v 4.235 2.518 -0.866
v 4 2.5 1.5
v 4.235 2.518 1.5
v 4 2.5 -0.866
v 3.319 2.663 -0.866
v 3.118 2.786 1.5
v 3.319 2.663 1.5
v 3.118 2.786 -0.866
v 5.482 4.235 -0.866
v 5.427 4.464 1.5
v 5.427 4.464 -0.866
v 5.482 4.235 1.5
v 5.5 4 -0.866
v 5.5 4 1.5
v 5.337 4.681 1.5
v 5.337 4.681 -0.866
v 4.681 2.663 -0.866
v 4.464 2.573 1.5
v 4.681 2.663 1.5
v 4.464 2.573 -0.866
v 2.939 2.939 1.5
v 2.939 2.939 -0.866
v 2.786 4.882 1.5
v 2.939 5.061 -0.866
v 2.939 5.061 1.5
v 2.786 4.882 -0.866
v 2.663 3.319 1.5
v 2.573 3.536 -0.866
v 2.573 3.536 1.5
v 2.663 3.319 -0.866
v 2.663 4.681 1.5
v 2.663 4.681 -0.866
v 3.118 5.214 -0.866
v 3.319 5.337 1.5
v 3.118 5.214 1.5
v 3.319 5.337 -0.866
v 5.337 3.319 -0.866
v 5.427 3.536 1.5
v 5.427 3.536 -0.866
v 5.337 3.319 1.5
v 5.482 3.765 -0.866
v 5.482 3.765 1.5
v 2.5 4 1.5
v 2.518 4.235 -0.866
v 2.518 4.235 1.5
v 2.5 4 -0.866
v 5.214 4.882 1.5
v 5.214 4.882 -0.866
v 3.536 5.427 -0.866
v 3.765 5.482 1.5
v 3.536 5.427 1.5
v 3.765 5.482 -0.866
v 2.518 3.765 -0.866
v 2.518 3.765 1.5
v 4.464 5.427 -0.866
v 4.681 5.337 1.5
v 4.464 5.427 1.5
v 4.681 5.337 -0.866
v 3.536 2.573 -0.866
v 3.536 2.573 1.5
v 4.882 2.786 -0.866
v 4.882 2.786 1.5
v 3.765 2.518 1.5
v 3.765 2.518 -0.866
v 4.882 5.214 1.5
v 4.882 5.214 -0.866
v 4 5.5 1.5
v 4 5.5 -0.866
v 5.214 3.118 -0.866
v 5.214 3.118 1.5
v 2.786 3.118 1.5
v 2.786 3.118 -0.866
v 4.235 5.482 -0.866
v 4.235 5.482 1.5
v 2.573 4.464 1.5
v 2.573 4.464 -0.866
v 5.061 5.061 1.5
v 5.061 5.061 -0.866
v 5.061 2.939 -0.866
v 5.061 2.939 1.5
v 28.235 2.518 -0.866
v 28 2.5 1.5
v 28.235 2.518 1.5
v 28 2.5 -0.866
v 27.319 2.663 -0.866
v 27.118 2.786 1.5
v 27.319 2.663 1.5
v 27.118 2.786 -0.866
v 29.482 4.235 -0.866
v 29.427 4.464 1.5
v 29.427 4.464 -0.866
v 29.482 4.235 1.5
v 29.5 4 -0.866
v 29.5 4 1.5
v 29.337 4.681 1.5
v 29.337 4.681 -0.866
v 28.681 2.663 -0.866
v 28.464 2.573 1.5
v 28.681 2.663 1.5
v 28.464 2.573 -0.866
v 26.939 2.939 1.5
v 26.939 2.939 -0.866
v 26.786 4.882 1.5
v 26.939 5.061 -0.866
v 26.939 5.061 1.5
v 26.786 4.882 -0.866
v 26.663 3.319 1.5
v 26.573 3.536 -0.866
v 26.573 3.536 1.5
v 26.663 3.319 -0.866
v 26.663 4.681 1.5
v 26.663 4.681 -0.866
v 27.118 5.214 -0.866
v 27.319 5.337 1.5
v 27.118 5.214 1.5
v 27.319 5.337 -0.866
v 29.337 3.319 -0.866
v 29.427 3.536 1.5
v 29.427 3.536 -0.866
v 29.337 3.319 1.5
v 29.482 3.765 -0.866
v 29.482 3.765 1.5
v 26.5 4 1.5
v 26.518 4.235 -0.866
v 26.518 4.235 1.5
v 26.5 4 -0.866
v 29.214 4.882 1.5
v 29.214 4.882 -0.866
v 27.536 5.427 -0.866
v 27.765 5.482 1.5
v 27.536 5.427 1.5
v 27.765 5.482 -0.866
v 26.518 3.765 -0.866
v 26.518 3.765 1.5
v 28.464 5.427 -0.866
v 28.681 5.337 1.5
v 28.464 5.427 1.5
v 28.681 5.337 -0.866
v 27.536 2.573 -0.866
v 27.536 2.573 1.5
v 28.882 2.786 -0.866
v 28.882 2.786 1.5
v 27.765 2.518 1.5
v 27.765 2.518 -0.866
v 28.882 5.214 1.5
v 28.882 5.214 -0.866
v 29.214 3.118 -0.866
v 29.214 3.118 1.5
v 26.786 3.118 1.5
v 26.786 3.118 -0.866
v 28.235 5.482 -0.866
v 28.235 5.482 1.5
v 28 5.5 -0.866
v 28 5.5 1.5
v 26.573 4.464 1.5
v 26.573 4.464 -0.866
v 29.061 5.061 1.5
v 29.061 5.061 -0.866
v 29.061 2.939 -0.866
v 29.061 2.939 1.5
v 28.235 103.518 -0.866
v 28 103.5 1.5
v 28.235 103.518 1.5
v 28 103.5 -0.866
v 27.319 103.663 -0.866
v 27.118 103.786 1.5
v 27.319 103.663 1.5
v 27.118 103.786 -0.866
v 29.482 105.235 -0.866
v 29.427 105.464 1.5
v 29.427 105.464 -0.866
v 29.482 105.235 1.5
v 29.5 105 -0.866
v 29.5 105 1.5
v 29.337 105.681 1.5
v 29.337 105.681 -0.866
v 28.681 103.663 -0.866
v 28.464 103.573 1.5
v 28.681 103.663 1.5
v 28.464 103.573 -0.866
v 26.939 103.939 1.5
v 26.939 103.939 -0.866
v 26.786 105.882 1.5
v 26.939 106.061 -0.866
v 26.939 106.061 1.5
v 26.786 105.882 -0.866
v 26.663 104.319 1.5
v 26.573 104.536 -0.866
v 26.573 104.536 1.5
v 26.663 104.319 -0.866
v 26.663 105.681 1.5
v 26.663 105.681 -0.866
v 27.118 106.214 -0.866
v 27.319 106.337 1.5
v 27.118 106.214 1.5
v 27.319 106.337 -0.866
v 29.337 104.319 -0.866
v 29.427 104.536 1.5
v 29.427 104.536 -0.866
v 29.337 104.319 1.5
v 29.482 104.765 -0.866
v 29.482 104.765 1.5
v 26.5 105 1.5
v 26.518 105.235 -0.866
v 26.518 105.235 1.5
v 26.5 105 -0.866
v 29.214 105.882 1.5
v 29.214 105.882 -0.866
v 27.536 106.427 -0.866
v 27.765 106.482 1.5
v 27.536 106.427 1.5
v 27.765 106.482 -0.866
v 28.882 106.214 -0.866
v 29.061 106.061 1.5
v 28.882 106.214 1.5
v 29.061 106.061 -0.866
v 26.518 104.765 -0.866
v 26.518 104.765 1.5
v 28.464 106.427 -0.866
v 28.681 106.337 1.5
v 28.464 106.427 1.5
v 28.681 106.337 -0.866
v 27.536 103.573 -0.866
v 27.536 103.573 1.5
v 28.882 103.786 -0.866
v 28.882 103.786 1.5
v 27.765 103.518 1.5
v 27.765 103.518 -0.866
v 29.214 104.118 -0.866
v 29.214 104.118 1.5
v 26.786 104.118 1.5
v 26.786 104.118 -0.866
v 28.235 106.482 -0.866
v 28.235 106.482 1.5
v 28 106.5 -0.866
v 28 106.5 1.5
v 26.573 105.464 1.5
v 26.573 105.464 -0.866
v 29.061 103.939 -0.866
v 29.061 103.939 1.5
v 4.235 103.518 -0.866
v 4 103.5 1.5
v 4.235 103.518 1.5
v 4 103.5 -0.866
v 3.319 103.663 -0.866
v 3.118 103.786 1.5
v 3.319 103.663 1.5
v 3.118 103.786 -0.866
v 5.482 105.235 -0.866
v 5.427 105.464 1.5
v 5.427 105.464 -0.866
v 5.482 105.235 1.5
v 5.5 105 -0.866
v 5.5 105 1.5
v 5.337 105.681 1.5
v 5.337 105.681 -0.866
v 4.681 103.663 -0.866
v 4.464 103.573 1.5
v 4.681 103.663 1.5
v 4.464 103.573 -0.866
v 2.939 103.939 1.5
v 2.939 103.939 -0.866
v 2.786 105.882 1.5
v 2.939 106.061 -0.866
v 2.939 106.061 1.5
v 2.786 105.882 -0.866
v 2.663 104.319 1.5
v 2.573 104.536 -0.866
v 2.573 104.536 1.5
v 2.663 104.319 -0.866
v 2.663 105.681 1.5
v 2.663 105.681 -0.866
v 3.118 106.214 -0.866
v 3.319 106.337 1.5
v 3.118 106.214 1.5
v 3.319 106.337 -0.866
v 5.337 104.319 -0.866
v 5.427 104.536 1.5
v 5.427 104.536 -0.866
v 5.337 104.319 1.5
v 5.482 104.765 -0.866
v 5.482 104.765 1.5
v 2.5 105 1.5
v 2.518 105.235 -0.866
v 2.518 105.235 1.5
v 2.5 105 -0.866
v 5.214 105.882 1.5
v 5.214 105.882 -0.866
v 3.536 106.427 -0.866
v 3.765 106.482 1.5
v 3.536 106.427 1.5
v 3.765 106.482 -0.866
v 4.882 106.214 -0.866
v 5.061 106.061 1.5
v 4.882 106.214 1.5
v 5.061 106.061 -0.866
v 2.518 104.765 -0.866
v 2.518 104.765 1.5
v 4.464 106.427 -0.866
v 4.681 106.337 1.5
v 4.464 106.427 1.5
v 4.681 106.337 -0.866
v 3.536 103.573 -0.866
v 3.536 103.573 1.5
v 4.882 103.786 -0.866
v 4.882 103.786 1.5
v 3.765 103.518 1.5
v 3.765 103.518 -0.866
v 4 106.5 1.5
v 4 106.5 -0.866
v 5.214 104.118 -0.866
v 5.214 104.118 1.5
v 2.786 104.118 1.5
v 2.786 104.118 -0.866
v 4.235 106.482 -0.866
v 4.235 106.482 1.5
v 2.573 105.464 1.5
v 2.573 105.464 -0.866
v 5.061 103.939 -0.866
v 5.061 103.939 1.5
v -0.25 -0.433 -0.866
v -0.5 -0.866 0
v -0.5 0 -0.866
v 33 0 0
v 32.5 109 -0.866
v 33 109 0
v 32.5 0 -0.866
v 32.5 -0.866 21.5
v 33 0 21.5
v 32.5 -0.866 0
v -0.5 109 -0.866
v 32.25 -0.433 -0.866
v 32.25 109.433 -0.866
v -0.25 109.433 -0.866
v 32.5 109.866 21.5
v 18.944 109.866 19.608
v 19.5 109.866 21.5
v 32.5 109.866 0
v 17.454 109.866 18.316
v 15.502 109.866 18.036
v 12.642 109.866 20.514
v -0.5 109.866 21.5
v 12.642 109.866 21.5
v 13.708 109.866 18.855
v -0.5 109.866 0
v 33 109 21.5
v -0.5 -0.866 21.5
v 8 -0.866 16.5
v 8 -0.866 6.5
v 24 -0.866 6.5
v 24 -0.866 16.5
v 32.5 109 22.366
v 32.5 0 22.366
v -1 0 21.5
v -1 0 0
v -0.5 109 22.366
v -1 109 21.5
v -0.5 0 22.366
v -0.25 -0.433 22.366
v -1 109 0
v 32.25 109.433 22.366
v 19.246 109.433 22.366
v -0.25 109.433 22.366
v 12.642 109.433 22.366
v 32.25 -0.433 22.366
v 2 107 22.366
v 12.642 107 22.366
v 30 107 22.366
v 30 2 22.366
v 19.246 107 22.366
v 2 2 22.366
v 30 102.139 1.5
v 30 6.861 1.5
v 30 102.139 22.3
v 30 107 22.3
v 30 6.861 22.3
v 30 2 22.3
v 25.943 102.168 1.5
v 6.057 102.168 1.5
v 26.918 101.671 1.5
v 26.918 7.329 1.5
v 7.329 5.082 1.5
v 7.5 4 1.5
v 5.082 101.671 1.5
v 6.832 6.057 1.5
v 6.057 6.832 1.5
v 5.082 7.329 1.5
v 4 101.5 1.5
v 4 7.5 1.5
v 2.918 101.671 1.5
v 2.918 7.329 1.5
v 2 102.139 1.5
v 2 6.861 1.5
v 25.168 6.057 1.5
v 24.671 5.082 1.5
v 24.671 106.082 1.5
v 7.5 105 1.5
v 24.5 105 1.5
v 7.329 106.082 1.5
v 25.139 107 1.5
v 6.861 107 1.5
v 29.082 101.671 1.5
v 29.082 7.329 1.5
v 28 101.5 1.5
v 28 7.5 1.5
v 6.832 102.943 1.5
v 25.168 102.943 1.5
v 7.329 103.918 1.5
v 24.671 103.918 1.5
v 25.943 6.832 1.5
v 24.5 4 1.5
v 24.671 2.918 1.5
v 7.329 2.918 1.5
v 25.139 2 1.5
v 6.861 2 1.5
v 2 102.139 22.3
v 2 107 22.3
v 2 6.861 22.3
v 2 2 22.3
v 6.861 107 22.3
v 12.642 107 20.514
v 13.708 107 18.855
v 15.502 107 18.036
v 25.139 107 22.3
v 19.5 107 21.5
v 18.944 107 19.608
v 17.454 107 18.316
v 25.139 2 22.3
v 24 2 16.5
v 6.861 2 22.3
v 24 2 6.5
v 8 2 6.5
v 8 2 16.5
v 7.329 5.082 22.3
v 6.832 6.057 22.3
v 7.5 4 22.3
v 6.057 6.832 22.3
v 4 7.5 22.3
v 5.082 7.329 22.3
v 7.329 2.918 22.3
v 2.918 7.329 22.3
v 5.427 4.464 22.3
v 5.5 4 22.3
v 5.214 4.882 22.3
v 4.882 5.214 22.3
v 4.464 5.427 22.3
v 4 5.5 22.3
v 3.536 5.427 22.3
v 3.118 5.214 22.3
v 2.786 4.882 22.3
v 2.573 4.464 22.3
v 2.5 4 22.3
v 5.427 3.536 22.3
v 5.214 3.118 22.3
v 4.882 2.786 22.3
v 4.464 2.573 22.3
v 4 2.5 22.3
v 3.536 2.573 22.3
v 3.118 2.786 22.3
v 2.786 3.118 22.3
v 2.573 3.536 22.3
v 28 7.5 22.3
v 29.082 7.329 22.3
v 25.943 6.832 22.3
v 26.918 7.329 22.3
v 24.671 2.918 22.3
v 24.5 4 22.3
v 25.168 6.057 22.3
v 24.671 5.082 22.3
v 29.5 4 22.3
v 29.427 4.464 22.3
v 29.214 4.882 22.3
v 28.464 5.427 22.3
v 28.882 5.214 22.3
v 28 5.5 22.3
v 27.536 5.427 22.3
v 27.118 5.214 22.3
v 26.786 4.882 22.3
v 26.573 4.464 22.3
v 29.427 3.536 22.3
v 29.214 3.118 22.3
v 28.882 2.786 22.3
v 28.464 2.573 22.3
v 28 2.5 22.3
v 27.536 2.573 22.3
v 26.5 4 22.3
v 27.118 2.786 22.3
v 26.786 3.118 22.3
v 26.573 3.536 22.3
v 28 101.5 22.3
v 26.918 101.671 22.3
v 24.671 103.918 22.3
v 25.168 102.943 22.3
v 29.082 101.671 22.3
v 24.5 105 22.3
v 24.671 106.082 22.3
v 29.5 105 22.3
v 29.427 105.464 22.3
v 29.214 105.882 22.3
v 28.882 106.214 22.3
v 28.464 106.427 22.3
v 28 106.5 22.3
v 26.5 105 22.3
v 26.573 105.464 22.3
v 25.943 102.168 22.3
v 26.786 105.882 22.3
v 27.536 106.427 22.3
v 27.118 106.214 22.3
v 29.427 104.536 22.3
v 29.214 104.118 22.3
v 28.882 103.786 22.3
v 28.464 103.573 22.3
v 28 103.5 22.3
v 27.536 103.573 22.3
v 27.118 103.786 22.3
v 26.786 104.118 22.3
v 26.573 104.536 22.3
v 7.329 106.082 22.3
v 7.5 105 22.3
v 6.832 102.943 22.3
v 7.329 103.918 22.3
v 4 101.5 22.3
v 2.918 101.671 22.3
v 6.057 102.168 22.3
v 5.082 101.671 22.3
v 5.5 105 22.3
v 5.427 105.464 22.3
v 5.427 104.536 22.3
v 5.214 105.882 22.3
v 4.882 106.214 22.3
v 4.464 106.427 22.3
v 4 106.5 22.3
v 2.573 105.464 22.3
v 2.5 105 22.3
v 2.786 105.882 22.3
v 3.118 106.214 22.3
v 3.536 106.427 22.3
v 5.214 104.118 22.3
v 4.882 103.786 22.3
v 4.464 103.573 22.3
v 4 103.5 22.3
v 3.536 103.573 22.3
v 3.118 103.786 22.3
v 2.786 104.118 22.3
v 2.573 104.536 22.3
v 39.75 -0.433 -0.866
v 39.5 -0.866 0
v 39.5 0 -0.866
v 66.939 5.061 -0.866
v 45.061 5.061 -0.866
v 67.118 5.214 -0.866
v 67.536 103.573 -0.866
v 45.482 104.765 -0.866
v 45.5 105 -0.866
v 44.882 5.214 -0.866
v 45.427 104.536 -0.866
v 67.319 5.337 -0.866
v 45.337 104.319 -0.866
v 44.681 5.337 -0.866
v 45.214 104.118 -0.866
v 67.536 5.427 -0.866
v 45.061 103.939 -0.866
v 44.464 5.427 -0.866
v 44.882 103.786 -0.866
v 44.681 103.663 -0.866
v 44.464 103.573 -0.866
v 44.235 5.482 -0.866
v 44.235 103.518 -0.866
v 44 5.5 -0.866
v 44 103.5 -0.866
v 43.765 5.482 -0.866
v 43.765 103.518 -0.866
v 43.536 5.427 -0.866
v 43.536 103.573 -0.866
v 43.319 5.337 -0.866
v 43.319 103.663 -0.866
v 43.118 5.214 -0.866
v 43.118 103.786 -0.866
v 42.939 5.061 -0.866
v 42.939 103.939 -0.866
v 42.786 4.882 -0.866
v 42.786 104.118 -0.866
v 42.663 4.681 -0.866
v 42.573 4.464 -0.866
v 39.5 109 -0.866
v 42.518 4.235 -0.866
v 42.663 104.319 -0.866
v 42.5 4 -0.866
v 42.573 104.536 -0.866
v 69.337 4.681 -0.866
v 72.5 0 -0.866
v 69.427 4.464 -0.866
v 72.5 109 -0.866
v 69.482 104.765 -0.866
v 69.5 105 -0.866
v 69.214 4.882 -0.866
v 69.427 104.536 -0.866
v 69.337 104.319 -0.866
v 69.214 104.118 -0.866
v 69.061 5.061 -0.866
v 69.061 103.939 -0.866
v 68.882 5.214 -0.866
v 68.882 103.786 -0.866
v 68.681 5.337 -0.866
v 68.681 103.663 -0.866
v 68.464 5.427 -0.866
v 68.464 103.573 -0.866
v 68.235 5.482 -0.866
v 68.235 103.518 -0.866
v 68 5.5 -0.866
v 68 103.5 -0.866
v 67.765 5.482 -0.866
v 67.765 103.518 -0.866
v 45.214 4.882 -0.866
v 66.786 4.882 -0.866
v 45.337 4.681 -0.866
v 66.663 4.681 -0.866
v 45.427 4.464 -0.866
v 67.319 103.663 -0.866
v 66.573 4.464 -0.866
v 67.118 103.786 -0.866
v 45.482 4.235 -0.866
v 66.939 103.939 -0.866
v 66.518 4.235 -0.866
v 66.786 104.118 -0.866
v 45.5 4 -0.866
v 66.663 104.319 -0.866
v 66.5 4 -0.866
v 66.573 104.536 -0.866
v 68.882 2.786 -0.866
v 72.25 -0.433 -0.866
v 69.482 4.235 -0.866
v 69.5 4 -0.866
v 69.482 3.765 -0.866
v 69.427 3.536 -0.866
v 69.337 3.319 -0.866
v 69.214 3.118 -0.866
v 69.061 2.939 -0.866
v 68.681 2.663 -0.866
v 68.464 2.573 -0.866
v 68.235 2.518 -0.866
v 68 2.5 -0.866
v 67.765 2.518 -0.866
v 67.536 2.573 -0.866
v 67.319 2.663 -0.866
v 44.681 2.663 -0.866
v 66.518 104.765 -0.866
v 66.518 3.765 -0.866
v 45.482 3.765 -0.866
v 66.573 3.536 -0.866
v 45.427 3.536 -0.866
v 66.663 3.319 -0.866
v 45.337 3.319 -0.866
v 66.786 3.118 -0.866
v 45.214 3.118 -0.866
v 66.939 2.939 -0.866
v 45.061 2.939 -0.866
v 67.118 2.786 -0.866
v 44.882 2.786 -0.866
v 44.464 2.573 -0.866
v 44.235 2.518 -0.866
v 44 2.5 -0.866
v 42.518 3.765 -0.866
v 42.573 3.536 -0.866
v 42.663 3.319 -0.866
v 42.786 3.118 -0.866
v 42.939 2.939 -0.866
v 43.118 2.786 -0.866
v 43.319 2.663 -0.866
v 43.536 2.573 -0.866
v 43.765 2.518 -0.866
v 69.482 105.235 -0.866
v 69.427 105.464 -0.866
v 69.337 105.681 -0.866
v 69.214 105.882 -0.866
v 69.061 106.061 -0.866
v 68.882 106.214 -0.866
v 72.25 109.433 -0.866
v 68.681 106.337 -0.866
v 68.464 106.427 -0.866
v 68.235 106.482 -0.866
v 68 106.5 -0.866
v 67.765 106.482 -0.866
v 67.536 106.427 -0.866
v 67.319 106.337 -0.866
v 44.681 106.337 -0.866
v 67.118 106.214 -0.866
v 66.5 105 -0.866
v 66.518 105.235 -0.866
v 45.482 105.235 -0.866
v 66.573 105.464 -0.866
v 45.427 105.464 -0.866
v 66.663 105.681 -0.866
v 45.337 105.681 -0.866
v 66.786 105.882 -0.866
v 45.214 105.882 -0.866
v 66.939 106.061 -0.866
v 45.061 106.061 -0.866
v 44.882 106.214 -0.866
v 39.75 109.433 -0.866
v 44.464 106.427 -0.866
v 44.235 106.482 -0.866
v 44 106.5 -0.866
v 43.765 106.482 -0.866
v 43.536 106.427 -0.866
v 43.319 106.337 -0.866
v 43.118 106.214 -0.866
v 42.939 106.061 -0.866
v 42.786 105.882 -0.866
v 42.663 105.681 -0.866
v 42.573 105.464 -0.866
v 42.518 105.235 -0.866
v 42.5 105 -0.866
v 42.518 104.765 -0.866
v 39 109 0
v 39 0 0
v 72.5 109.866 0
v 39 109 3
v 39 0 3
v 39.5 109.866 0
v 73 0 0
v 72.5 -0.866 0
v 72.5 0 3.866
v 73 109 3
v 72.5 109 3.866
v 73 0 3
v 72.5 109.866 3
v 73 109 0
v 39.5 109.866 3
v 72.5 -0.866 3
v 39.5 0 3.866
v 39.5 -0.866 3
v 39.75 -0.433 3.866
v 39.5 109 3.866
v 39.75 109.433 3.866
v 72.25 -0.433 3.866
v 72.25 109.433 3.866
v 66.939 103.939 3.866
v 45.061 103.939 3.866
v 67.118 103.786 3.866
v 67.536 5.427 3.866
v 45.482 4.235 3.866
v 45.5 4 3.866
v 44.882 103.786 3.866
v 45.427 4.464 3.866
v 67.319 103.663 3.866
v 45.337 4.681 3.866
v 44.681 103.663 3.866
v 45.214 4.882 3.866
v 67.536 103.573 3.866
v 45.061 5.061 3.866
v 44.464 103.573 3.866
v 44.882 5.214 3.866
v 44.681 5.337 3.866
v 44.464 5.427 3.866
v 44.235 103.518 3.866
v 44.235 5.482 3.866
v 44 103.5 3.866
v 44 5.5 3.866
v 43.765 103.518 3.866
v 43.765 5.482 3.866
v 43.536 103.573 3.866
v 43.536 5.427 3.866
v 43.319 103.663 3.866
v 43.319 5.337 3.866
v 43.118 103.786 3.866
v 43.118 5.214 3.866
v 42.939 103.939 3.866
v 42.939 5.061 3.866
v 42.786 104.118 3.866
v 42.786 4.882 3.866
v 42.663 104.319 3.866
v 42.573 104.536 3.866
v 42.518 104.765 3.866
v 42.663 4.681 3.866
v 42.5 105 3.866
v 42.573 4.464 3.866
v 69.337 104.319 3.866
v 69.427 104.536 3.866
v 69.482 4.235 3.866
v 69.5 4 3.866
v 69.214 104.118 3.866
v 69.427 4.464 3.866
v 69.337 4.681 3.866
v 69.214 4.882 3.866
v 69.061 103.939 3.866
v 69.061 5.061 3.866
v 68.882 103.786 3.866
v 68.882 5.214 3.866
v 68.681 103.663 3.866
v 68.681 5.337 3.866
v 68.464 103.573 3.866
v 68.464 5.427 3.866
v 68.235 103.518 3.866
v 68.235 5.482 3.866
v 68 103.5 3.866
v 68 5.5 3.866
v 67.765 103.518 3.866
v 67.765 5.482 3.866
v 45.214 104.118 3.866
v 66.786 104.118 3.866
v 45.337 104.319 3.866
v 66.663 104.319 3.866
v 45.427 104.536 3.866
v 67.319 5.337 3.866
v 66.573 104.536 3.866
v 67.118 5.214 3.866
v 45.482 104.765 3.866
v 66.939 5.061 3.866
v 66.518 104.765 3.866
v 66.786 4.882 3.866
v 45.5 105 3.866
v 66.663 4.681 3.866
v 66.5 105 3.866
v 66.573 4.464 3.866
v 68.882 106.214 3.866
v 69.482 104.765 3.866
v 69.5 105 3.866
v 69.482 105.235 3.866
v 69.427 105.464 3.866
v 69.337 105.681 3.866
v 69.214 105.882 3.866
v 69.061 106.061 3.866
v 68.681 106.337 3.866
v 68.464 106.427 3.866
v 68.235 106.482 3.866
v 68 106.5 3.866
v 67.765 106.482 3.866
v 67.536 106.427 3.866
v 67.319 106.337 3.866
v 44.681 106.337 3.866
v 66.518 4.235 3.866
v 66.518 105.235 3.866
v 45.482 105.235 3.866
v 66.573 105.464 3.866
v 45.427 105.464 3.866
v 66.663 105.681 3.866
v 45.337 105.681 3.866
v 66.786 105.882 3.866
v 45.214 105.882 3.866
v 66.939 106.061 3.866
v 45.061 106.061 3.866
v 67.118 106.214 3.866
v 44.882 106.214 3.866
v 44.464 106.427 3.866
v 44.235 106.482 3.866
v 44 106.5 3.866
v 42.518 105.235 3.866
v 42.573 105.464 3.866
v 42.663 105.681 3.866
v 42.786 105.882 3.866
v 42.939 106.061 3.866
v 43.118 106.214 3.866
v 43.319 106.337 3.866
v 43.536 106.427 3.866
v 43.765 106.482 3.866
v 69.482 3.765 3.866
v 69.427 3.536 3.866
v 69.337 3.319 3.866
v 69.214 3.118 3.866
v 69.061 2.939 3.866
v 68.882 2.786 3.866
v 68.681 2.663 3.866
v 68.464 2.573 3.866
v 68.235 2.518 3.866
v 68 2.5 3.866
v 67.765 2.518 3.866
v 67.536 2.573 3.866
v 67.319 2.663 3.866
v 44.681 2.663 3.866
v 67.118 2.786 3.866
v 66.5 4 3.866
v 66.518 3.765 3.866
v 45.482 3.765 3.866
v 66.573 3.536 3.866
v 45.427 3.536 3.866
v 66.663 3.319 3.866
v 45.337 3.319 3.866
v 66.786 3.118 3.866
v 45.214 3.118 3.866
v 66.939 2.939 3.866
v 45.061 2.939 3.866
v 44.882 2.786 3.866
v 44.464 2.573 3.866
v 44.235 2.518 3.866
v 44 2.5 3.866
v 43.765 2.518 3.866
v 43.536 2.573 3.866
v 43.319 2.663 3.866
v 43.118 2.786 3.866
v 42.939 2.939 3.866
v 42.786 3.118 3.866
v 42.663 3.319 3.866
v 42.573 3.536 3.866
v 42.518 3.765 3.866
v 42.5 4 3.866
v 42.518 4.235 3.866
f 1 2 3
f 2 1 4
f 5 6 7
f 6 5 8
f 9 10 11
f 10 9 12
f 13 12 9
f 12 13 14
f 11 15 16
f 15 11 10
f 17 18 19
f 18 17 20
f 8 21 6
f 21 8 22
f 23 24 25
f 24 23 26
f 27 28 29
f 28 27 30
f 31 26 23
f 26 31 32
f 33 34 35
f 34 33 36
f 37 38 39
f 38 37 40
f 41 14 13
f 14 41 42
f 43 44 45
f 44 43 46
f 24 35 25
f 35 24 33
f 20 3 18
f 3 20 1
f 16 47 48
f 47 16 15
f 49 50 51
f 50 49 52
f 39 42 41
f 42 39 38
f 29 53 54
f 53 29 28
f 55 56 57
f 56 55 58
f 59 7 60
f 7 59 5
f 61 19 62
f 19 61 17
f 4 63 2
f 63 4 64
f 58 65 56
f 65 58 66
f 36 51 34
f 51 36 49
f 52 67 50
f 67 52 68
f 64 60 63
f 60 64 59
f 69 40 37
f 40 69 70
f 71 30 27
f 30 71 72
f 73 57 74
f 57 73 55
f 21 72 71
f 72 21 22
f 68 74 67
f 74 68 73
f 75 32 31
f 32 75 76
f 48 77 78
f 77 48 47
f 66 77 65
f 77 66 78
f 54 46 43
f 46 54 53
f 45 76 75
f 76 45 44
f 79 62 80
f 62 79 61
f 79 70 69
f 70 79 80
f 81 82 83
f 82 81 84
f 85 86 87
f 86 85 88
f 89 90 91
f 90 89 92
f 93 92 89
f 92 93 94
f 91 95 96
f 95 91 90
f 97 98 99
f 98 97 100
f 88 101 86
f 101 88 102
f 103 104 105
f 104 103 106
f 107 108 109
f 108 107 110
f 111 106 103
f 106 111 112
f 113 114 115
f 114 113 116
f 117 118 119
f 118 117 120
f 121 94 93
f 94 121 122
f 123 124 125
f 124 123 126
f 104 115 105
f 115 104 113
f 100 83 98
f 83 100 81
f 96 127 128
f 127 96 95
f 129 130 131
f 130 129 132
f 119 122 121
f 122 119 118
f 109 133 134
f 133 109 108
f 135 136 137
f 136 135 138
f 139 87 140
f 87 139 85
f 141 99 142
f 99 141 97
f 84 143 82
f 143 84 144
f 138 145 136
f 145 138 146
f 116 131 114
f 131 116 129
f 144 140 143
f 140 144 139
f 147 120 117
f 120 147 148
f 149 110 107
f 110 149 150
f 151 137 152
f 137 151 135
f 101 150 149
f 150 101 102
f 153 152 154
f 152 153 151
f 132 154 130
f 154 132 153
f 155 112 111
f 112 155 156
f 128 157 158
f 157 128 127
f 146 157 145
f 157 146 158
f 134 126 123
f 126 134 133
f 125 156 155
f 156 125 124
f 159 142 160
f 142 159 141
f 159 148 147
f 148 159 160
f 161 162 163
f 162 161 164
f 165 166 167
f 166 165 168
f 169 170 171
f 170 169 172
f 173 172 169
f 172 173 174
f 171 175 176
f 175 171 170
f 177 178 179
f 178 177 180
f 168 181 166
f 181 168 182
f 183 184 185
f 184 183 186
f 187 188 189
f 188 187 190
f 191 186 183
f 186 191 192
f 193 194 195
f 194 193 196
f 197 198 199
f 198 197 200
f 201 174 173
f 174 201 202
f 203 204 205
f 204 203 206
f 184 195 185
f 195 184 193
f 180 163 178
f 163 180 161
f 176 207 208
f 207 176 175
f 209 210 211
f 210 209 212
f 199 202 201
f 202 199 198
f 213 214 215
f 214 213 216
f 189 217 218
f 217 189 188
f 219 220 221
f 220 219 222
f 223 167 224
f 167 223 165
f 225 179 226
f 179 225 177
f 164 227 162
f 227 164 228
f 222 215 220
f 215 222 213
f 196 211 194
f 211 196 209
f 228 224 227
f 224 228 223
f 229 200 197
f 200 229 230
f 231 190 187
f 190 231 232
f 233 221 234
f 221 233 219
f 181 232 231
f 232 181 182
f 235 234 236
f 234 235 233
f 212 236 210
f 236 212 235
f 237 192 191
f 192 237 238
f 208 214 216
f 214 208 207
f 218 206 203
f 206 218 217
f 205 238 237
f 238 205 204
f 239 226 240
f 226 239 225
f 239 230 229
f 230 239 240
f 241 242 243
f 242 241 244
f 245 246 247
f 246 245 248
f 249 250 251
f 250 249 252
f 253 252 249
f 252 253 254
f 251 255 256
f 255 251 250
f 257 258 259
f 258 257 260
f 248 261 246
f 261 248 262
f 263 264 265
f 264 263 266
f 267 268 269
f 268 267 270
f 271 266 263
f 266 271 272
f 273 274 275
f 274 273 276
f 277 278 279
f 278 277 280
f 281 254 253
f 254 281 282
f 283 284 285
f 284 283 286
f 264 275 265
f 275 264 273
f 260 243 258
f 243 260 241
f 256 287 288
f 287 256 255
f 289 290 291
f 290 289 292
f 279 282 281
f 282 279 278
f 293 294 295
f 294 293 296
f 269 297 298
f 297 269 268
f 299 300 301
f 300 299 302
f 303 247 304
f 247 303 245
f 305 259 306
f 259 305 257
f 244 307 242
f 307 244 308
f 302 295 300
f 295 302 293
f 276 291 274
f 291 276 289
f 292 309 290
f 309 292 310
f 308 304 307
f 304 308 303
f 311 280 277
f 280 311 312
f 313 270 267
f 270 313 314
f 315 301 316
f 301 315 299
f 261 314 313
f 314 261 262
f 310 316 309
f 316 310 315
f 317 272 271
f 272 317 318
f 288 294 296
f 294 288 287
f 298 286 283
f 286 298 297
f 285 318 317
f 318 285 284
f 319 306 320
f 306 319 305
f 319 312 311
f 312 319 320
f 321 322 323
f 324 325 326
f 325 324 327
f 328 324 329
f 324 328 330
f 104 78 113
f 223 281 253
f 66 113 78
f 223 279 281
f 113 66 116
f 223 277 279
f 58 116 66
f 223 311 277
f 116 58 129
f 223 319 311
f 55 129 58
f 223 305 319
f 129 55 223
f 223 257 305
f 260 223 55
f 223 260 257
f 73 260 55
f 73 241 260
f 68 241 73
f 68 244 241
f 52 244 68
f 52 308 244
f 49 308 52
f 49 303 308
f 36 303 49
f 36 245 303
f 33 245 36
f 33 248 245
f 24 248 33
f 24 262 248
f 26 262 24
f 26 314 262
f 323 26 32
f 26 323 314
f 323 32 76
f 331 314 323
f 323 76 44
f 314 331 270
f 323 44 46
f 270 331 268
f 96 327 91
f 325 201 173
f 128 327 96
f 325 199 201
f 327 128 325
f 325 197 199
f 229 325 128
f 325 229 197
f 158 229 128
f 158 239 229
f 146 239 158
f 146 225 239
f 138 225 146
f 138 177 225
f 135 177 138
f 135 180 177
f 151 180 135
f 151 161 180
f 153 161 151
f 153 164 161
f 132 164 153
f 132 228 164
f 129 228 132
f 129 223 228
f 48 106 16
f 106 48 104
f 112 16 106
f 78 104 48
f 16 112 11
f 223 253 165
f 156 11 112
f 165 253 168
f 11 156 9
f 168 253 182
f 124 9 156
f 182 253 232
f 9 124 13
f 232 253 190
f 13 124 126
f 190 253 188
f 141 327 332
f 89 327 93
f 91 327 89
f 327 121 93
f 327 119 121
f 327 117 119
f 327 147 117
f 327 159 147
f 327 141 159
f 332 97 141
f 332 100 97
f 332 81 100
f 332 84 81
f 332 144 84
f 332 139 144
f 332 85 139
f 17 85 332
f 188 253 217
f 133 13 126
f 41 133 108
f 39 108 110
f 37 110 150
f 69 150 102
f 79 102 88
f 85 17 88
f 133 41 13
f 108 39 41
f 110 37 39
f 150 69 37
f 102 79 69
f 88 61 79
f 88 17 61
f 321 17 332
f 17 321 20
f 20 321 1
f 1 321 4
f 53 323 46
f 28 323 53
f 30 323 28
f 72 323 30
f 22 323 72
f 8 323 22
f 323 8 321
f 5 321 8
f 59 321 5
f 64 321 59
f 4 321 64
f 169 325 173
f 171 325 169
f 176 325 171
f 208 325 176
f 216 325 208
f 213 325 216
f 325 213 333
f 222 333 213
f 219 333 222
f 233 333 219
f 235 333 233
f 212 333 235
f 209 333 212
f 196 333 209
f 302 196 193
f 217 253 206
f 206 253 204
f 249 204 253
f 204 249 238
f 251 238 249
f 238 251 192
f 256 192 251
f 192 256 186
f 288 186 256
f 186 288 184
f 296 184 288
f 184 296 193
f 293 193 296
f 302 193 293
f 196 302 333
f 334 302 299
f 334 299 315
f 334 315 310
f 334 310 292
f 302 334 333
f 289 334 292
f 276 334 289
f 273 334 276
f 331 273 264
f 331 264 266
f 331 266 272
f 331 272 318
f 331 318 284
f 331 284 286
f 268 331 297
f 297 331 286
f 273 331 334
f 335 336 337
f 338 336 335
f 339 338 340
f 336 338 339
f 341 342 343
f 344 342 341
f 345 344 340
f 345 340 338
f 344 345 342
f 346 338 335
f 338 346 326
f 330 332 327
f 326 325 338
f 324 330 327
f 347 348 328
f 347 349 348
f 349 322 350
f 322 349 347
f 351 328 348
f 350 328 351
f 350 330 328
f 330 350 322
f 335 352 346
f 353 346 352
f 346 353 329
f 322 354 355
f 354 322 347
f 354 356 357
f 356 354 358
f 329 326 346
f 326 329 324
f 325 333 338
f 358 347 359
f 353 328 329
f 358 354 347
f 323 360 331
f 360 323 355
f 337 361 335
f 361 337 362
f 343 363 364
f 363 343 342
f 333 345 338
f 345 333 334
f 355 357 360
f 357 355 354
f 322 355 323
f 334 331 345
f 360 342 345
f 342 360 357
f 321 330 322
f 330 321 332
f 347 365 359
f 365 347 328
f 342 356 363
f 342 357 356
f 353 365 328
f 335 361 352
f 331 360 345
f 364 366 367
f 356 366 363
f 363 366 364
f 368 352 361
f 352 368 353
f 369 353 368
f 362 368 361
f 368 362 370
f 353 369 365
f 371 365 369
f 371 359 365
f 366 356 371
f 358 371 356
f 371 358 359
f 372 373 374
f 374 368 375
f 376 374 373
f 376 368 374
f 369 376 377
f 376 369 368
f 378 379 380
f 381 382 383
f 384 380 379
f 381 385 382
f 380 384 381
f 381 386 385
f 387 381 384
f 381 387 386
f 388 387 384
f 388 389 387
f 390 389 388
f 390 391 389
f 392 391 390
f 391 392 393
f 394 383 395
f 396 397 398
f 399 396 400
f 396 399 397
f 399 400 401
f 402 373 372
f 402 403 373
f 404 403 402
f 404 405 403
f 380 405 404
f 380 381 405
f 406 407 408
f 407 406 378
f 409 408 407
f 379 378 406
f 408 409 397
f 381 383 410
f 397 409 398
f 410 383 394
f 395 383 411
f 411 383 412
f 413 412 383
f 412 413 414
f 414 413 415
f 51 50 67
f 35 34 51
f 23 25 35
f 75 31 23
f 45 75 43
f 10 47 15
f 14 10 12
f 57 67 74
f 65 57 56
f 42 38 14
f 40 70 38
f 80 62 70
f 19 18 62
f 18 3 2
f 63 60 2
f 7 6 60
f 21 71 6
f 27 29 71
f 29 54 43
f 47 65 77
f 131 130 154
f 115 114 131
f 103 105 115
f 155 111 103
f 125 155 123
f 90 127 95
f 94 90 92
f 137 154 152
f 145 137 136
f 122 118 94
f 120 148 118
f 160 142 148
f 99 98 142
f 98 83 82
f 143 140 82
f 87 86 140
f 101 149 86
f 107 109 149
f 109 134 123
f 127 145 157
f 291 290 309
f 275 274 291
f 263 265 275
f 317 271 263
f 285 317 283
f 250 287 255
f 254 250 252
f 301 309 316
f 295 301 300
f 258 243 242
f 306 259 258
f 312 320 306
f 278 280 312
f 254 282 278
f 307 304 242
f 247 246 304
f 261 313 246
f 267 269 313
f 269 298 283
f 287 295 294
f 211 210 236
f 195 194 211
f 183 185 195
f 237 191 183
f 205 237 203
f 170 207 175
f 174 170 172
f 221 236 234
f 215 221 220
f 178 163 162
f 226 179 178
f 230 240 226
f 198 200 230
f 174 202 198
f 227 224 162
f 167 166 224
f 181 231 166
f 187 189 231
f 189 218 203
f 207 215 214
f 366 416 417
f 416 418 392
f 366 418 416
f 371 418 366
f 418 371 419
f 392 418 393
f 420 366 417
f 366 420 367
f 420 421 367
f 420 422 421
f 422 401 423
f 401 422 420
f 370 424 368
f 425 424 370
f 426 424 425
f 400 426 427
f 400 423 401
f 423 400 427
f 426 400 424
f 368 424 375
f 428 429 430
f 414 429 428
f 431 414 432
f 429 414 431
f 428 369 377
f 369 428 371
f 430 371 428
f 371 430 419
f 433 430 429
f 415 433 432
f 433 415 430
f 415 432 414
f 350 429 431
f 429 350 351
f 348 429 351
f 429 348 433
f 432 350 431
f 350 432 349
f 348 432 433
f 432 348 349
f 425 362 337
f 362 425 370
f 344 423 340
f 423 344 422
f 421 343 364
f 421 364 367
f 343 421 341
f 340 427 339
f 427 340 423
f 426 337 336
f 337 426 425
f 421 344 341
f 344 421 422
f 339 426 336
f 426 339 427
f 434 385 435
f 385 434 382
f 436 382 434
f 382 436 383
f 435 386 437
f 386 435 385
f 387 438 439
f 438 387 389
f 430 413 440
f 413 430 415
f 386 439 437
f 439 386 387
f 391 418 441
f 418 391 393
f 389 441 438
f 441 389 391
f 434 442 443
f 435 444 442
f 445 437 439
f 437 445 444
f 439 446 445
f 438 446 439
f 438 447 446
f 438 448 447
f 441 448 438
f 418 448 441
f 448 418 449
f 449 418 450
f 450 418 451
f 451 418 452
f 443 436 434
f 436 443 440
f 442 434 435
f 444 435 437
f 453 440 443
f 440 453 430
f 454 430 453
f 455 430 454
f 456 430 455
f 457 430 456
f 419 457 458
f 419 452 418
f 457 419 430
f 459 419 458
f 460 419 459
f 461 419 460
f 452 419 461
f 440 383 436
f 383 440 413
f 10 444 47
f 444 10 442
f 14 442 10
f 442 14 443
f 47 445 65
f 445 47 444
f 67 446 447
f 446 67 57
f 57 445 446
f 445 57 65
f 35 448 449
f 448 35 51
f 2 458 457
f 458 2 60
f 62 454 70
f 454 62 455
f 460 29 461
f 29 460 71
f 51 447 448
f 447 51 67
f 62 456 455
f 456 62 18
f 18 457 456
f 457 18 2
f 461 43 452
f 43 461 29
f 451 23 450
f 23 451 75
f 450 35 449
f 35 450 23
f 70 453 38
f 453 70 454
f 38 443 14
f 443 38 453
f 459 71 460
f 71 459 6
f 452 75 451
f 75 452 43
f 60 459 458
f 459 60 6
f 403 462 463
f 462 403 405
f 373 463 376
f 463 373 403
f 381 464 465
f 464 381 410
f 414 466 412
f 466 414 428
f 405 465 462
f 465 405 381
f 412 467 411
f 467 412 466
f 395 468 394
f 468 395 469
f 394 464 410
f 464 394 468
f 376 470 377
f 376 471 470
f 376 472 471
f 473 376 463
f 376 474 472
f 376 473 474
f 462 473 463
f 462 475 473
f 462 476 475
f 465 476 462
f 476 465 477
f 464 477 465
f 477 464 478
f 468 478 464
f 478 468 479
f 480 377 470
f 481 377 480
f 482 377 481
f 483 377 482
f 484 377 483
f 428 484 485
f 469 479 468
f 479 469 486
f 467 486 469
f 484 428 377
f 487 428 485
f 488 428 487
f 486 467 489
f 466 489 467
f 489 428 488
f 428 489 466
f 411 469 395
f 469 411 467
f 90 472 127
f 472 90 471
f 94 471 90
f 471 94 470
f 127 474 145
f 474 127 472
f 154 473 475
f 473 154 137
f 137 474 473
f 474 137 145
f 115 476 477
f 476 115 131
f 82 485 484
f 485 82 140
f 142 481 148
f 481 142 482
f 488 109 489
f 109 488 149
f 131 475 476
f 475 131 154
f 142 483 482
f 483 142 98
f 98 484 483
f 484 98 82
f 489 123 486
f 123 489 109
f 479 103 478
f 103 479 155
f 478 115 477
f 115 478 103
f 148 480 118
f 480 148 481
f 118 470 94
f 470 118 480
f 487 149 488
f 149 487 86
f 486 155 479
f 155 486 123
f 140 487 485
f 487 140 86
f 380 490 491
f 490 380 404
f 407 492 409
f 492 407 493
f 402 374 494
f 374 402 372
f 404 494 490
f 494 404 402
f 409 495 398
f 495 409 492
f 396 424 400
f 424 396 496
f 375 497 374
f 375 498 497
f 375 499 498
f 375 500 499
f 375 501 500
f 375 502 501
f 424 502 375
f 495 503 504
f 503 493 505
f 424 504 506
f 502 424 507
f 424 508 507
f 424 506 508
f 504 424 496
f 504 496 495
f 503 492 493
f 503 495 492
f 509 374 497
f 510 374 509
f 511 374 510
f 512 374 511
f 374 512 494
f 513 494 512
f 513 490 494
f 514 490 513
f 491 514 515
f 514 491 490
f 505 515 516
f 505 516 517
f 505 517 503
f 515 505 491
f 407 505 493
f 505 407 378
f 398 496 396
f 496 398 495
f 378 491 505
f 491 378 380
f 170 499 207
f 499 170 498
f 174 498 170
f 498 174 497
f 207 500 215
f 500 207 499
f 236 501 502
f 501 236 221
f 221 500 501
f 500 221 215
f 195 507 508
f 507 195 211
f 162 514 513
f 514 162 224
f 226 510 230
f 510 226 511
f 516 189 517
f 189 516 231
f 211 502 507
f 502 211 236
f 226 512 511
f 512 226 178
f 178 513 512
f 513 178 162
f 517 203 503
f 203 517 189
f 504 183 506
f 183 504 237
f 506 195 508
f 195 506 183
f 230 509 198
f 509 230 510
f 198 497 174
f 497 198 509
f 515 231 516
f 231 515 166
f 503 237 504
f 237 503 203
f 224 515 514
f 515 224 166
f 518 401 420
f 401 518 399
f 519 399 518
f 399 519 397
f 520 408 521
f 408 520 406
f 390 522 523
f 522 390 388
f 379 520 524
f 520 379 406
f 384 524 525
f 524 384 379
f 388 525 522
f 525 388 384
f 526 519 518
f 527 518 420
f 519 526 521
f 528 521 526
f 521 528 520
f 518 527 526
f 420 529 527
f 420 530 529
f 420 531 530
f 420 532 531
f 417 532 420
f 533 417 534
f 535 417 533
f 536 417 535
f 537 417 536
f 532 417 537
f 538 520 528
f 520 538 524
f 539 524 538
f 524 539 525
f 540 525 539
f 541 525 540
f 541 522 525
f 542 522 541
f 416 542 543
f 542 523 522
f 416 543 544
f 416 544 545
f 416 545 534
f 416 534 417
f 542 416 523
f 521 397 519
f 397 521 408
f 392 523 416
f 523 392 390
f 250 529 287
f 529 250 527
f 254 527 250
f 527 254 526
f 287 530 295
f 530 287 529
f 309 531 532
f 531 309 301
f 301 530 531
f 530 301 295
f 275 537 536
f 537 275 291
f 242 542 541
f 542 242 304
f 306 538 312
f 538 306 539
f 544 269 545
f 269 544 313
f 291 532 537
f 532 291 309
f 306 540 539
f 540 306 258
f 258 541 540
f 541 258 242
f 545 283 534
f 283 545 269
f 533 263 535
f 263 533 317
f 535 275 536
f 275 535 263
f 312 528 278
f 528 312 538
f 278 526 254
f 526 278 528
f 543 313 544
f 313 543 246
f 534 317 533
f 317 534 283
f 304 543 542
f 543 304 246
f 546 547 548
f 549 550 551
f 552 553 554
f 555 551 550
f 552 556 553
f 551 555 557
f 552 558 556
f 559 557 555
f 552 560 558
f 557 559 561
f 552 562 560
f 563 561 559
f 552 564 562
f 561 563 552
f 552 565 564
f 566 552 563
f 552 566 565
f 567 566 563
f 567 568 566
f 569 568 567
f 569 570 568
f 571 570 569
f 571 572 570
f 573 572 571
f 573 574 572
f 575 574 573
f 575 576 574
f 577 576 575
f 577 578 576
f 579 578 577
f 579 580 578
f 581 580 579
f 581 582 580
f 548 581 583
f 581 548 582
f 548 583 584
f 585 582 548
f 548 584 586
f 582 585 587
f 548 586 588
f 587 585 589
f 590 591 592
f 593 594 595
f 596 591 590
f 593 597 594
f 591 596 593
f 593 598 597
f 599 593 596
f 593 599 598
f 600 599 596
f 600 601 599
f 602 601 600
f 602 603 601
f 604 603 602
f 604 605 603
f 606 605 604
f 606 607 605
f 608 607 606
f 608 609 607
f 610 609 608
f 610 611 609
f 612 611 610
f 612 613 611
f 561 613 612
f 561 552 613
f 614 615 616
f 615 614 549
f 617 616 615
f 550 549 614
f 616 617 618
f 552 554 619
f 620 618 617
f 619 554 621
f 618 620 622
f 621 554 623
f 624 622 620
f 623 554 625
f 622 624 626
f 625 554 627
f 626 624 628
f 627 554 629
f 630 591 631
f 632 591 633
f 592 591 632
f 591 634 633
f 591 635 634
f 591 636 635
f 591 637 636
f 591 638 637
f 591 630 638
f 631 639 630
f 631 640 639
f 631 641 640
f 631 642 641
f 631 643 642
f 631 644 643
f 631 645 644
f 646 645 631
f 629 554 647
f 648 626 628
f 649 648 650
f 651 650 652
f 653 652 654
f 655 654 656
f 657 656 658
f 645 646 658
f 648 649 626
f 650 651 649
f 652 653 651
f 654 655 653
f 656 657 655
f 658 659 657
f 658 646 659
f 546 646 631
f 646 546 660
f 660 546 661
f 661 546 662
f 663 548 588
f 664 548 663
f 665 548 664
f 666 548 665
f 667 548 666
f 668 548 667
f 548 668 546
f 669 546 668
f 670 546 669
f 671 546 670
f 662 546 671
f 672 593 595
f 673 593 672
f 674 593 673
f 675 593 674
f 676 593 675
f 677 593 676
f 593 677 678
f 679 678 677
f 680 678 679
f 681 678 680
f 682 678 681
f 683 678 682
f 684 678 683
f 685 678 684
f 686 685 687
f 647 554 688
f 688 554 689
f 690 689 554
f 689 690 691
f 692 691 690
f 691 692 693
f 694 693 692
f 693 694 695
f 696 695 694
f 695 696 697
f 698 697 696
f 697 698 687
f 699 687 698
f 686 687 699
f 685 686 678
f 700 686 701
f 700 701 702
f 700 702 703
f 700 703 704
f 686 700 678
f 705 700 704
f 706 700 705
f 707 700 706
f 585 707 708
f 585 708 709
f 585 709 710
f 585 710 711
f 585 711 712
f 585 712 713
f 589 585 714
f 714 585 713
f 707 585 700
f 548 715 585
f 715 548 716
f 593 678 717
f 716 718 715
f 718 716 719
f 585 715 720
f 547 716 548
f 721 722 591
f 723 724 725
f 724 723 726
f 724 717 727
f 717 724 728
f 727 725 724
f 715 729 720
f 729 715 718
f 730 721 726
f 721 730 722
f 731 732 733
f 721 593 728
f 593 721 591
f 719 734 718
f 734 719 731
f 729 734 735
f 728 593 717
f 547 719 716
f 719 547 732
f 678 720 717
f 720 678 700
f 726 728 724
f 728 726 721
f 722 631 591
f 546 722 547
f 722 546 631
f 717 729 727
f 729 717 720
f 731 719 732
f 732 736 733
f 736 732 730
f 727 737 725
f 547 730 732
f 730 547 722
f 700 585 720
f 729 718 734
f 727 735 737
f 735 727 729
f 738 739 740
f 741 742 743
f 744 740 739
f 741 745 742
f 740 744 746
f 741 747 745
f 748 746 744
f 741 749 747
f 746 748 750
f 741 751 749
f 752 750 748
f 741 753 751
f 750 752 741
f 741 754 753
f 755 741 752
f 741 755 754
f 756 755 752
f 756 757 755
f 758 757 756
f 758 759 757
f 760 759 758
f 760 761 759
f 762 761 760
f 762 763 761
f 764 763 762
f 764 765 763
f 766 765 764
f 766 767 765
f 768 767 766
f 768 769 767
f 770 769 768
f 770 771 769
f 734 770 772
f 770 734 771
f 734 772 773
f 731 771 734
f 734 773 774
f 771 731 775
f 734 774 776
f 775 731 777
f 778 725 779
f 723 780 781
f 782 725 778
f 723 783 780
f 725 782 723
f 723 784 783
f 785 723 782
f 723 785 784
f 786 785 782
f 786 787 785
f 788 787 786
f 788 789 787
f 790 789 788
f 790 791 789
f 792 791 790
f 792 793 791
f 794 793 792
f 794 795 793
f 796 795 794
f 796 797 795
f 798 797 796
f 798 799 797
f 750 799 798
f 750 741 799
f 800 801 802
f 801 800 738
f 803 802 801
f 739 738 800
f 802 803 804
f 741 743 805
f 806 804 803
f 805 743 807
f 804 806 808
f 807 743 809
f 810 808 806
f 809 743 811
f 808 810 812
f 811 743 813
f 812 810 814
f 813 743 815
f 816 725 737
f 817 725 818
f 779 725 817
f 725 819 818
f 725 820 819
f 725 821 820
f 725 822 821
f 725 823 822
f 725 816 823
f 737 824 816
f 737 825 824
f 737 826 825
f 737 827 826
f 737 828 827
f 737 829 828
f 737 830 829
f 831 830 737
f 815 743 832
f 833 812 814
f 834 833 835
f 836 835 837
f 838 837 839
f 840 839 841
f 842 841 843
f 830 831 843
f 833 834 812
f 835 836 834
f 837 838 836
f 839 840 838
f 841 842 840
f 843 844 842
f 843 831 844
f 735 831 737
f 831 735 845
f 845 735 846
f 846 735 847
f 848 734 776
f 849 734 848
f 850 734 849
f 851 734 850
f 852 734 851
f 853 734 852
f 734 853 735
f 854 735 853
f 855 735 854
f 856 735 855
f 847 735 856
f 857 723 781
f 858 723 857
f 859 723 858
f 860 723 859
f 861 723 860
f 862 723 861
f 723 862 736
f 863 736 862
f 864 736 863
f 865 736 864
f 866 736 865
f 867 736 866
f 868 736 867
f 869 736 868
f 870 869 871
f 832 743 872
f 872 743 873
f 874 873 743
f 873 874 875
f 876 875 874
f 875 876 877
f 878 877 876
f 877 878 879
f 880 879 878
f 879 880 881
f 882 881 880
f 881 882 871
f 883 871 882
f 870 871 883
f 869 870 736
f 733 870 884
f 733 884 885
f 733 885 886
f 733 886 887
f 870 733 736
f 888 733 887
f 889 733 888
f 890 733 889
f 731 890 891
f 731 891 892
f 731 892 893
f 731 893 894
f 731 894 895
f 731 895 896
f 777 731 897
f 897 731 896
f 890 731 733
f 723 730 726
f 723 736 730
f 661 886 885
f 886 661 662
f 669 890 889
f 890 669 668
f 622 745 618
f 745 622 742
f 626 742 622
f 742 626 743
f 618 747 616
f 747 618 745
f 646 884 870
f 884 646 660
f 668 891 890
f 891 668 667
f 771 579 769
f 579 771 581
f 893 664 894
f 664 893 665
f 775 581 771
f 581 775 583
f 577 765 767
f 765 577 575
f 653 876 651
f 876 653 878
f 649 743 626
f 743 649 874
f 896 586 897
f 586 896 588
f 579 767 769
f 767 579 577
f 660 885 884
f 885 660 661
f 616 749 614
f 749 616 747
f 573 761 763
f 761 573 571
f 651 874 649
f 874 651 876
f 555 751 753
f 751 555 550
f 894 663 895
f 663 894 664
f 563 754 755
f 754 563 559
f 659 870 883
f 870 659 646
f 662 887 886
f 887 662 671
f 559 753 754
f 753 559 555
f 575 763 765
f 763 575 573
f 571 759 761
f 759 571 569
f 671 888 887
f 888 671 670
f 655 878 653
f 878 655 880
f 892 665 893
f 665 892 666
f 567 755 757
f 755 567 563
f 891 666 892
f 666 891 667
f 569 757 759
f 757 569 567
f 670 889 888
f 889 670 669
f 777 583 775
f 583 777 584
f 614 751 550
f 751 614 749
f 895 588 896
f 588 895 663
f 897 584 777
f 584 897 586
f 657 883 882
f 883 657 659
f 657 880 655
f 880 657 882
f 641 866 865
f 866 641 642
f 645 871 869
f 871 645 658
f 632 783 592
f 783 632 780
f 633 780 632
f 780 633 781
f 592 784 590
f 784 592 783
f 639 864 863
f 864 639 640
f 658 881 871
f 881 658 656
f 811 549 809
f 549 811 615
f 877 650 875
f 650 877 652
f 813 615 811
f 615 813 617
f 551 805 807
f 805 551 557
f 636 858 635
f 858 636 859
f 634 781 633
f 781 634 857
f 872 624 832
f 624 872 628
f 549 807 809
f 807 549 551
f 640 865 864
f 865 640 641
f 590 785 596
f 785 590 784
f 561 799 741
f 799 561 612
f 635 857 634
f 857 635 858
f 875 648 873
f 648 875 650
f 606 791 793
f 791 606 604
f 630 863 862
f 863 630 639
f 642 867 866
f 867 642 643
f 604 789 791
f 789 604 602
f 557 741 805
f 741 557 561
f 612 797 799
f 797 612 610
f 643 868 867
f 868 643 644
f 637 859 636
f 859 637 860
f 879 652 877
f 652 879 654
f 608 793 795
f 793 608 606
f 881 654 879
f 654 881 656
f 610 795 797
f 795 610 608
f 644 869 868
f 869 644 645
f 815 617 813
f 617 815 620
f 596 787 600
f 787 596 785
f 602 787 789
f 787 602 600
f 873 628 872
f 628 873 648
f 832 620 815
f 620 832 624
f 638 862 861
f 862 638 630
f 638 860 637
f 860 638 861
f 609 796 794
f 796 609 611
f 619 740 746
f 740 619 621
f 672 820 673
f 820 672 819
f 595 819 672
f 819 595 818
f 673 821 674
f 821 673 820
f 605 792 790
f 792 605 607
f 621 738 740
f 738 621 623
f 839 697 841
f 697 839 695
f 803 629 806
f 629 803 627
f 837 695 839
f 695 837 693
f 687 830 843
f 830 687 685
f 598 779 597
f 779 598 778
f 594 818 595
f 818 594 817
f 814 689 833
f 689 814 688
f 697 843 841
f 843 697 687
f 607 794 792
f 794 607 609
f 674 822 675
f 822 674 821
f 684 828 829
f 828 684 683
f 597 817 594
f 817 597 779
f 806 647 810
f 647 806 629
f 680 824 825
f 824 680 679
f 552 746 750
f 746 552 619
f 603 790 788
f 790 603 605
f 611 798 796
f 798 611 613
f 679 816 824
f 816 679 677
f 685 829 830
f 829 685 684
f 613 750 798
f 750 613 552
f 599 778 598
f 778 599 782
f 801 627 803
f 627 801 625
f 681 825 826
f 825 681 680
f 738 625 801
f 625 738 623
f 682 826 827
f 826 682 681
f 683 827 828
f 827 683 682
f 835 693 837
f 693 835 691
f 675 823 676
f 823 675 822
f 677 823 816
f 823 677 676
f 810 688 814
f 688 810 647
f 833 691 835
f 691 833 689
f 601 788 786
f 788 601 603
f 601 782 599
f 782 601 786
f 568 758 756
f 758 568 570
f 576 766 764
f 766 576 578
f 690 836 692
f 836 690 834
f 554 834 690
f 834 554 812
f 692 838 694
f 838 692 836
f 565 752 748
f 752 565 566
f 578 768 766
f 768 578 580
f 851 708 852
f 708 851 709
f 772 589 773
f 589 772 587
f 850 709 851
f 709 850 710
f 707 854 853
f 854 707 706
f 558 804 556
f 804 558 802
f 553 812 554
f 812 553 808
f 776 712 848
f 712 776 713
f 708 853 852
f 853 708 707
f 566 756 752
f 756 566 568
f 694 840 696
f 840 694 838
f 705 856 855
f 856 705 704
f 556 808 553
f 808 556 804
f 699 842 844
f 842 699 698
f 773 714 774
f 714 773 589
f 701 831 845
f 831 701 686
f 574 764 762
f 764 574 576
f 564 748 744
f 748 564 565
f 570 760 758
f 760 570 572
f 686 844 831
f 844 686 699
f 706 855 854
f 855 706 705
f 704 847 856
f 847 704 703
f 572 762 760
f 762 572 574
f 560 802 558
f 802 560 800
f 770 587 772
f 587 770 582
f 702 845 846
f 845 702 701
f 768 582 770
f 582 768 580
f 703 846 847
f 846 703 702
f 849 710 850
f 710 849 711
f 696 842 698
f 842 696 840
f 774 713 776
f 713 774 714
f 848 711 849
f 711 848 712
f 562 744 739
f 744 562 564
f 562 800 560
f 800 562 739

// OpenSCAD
//inner width
iw = 20+8;

//inner length
il = 105;

//inner height
ih = 20;

//wall thickness
wth = 2;

//bottom thickness
bth = 1.5;

//mount hole radius
mhr = 1.5;

//mount hole wall thickness
mhwth = 2;

//usb hole width
uhw = 16;

//usb hole height
uhh = 10;

//cable hole radius
chr = 3.5;


module bottom_case()
{


difference()
{
minkowski()
{
cube([iw+wth*2,il+wth*2,ih+bth]);
sphere(r=1, $fn=6);
}

translate([wth, wth, bth])
cube([iw,il,ih+2]);


//USB hole
//translate([wth+iw/2-uhw/2,-1,bth+ih-uhh/2])

translate([wth+iw/2-uhw/2,-1,bth+5])
cube([uhw, wth*2, uhh]);

//cable hole
translate([wth+iw/2, wth*2+il+1,bth+ih])
rotate([90,0,0])
cylinder(r=chr,h=wth*2);


//holes through!
translate([0,0,-2])
{
translate([wth*2,wth*2,-bth])
cylinder(r=mhr, h=20, $fn=40);

translate([iw,wth*2,-bth])
cylinder(r=mhr, h=20, $fn=40);

translate([iw,il,-bth])
cylinder(r=mhr, h=20, $fn=40);

translate([wth*2,il,-bth])
cylinder(r=mhr, h=20, $fn=40);
}


}

//screw holes
translate([wth*2,wth*2,bth])
screw_hole();

translate([iw,wth*2,bth])
screw_hole();

translate([iw,il,bth])
screw_hole();

translate([wth*2,il,bth])
screw_hole();



}


module screw_hole(height=20.8)
{
$fn=20;
difference()
{
cylinder(r=mhr+mhwth,h=height);
cylinder(r=mhr,h=height+1);
}

}

module lid()
{
difference()
{
minkowski()
{
cube([iw+wth*2,il+wth*2,3]);

sphere(r=1, $fn=6);
}


//screw holes
translate([wth*2,wth*2,-bth])
cylinder(r=mhr, h=20, $fn=40);

translate([iw,wth*2,-bth])
cylinder(r=mhr, h=20, $fn=40);

translate([iw,il,-bth])
cylinder(r=mhr, h=20, $fn=40);

translate([wth*2,il,-bth])
cylinder(r=mhr, h=20, $fn=40);

}
}


//translate([0,0,15])
//screw_hole();

bottom_case();


translate([40,0,0])
lid();
